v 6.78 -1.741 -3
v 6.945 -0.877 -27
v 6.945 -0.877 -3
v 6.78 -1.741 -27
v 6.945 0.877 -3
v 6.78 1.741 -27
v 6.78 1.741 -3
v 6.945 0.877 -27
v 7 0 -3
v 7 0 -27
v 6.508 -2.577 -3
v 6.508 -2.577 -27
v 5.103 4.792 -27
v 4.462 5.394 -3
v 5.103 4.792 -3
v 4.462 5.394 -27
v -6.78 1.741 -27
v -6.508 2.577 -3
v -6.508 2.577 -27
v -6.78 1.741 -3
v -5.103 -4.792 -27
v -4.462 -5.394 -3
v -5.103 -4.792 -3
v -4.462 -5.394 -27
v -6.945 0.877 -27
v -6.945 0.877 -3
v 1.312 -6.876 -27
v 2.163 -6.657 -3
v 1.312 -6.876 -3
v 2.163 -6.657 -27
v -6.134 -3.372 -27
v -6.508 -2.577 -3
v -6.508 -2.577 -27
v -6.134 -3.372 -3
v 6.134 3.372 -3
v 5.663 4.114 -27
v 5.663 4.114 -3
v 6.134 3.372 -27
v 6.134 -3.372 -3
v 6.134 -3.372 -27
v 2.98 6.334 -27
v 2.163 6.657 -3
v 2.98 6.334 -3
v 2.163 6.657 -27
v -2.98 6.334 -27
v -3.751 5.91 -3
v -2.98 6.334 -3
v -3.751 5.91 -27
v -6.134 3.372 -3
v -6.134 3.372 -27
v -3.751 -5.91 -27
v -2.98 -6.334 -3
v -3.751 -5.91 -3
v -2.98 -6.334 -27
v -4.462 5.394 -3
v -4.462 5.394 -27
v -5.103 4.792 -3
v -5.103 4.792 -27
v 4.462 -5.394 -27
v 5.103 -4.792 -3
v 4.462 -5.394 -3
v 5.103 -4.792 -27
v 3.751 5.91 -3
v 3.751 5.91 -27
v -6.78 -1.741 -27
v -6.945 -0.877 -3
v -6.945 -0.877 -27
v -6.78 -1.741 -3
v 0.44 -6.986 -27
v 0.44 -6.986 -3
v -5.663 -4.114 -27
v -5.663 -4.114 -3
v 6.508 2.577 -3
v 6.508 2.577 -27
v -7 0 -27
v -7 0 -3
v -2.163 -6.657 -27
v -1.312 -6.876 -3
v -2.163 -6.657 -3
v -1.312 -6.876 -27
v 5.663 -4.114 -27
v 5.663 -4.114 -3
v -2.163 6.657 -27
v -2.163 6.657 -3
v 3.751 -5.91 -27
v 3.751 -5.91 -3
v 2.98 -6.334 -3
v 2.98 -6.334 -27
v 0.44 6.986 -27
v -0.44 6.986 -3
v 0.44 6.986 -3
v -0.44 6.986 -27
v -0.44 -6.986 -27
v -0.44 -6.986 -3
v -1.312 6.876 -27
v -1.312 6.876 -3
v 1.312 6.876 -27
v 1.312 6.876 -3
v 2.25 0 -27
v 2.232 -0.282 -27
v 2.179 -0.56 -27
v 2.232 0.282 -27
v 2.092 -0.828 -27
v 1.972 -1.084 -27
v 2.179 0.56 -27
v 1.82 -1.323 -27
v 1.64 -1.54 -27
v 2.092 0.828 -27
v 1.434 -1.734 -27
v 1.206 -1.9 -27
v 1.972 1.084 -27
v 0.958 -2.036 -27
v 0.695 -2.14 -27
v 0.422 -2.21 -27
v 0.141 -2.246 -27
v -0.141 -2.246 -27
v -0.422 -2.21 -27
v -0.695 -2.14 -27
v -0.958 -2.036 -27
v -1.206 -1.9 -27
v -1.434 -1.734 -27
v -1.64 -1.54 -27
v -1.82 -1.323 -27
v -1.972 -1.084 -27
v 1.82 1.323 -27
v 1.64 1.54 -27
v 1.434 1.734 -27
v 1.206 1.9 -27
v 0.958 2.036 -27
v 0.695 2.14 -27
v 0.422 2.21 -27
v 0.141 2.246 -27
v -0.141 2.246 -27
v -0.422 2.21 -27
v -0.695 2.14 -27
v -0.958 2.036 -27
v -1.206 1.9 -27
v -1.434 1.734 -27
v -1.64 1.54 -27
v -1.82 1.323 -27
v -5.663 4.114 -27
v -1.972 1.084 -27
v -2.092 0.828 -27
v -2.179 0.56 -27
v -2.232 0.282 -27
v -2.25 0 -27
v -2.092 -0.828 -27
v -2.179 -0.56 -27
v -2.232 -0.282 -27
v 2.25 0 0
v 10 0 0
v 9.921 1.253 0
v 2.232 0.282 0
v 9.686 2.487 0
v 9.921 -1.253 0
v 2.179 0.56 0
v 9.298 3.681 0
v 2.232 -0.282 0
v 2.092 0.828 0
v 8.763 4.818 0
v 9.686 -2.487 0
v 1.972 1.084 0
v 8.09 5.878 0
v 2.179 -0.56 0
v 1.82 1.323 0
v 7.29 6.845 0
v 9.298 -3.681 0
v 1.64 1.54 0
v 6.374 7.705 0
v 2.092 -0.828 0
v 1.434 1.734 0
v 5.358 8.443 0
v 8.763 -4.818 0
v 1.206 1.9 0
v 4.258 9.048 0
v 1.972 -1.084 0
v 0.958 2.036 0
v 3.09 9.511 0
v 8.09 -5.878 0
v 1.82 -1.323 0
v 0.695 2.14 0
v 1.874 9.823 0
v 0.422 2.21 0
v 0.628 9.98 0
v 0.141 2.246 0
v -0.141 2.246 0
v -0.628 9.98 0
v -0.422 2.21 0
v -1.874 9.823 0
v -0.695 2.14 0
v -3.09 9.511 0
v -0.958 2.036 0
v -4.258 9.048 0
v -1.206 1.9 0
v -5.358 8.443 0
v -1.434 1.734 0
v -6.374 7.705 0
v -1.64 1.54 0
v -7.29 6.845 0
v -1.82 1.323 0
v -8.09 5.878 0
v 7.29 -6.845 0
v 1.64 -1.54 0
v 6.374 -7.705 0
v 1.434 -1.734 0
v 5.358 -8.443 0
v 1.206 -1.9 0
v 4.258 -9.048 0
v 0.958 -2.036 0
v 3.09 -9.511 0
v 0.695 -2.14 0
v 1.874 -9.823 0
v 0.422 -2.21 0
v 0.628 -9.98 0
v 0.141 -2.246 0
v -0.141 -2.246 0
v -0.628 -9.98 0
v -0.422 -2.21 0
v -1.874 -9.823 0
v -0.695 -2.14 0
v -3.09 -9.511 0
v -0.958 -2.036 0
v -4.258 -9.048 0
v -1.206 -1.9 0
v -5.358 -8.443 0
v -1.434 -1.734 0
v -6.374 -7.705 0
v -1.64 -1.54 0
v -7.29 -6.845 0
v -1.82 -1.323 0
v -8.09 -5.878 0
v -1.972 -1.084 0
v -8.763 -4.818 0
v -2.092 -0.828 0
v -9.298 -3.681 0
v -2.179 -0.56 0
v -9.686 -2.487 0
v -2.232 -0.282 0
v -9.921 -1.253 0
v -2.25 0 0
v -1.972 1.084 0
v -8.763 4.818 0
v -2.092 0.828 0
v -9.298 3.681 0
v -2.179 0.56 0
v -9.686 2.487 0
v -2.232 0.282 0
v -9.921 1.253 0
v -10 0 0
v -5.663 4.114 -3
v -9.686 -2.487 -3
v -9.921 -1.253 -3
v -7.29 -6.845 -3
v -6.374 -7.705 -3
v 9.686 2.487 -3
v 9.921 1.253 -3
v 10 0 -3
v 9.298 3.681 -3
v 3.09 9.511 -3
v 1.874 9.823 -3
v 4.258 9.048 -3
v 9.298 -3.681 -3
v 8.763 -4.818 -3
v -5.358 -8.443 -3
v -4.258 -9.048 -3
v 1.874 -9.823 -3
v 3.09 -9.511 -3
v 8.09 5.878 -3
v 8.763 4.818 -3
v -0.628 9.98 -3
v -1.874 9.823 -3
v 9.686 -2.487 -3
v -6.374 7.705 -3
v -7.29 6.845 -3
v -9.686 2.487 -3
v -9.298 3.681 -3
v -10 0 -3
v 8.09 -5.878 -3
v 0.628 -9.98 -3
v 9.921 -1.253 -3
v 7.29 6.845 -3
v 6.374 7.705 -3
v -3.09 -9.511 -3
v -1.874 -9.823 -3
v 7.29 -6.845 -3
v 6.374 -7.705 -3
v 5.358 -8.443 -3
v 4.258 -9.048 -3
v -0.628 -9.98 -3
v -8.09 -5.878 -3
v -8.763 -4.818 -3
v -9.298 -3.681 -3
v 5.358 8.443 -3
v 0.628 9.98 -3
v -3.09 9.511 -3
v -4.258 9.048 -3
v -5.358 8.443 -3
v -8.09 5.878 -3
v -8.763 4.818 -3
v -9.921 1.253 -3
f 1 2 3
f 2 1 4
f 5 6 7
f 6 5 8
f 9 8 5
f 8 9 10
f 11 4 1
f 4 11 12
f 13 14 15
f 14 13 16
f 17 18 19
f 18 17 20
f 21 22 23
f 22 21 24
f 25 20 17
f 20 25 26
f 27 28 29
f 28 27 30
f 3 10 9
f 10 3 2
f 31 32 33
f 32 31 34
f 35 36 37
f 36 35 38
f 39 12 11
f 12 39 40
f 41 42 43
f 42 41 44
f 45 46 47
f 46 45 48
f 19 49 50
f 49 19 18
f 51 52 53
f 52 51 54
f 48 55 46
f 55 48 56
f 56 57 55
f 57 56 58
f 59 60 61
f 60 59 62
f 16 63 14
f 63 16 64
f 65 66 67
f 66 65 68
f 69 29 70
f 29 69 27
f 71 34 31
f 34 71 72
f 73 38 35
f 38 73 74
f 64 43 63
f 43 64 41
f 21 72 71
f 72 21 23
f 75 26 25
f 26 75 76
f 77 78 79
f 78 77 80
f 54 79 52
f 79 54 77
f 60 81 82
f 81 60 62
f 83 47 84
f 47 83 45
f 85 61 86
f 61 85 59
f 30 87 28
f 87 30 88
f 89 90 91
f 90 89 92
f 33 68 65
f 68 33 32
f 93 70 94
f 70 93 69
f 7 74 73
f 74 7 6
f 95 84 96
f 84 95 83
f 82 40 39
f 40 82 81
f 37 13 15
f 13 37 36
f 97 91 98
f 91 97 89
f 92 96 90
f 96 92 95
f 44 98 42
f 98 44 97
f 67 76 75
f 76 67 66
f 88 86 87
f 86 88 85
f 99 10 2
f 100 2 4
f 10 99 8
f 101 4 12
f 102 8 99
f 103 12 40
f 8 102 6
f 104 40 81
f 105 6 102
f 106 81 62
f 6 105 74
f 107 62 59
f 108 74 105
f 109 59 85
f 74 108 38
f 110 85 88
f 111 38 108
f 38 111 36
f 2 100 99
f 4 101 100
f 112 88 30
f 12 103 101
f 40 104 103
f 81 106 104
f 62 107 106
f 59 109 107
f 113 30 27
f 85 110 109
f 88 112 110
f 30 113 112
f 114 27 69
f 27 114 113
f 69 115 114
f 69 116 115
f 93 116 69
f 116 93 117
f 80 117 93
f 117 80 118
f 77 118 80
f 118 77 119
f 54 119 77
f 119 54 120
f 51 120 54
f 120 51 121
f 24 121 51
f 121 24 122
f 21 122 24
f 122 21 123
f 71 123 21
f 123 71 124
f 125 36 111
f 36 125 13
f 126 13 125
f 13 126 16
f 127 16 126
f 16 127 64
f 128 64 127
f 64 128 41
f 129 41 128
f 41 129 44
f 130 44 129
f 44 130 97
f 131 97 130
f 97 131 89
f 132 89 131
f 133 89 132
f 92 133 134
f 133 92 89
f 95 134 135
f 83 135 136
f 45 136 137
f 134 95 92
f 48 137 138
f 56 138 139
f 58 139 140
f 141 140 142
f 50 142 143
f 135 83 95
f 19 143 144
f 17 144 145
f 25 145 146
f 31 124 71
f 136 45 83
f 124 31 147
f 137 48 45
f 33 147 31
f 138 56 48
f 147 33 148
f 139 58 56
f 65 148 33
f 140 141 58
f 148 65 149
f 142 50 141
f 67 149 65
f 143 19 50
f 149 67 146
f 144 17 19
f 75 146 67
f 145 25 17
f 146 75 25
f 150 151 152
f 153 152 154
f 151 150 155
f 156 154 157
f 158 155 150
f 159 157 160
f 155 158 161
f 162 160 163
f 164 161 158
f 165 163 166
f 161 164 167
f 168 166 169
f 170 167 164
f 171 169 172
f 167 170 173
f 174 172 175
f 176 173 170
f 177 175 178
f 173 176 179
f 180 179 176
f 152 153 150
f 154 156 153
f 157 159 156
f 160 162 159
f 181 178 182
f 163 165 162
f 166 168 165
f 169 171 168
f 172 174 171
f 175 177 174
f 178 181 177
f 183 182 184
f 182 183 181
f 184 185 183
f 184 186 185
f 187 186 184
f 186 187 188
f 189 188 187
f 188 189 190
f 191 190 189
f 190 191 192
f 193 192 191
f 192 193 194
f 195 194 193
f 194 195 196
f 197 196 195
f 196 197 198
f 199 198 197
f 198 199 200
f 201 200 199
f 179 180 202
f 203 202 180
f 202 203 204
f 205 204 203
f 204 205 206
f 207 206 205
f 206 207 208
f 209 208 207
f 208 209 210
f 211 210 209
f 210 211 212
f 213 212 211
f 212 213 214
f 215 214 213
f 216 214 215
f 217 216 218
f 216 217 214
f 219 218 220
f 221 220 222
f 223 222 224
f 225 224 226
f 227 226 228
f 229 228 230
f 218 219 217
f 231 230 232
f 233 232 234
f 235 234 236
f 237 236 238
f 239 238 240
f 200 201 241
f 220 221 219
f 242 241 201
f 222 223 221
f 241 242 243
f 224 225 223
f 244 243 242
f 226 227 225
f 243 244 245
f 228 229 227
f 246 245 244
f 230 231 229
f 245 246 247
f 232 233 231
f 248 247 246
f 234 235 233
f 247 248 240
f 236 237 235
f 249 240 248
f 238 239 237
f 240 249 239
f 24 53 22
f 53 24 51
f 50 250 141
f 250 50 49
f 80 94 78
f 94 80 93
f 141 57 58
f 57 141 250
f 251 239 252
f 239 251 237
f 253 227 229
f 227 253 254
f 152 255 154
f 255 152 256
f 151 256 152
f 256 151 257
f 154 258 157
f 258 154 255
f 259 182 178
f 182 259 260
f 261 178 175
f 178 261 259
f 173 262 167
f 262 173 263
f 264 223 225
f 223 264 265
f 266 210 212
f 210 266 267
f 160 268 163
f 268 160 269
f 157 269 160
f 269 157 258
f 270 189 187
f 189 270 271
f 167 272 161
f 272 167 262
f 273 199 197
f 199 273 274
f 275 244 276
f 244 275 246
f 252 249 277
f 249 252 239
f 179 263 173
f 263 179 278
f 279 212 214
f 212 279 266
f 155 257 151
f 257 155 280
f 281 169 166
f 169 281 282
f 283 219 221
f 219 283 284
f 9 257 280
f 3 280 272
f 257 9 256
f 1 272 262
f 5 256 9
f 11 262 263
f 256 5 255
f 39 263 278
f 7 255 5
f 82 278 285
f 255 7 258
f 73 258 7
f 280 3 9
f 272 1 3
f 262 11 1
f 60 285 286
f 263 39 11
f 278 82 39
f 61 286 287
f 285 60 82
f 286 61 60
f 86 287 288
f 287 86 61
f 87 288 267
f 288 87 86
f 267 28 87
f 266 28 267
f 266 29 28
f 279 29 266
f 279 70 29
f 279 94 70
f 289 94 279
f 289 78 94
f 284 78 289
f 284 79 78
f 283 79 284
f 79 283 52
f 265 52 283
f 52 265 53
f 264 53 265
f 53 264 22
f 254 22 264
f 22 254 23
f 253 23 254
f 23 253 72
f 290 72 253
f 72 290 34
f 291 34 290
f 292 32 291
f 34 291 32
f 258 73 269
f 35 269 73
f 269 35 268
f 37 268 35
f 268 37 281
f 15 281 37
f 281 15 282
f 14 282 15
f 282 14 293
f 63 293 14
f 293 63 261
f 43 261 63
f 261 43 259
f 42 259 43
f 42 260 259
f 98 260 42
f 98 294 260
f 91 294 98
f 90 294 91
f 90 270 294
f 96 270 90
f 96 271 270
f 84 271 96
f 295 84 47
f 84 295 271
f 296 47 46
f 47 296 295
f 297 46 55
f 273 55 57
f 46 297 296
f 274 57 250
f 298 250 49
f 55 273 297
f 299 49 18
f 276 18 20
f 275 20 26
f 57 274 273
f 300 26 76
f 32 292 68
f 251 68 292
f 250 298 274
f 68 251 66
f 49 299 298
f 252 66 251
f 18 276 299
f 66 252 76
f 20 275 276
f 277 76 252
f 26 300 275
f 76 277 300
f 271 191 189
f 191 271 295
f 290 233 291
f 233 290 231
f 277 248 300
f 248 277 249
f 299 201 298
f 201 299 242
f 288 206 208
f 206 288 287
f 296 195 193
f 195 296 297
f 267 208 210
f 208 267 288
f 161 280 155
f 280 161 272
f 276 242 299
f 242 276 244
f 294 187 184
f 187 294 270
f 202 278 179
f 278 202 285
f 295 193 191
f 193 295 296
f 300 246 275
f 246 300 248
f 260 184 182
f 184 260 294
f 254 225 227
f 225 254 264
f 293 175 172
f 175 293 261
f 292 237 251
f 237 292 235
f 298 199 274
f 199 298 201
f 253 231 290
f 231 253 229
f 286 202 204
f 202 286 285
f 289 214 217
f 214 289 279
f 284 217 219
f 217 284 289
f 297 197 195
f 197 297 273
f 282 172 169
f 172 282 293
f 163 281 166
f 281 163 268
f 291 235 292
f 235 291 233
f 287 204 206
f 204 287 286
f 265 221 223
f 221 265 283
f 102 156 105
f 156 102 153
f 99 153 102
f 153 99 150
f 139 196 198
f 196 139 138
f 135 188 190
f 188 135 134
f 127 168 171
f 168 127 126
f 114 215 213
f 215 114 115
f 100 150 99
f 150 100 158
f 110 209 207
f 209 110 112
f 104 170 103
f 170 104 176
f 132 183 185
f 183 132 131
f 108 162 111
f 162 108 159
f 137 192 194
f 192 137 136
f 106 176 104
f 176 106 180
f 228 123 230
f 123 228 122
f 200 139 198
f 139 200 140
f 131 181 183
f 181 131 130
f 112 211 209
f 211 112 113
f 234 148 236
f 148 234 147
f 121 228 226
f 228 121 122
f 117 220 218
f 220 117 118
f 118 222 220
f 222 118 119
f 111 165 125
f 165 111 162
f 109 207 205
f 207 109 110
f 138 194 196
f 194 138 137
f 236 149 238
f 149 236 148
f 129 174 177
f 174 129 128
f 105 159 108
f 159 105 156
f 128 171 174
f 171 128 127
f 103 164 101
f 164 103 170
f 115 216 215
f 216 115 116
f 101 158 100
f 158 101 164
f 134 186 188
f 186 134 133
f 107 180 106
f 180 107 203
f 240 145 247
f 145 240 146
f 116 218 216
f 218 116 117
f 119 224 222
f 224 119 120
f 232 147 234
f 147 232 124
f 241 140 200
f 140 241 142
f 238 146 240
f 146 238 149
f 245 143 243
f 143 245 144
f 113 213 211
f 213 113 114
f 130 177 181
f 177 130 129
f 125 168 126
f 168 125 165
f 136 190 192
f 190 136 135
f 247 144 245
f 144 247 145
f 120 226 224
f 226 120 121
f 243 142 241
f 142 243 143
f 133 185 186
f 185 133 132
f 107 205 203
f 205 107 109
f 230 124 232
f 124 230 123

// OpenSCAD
$fn = 50;


difference() {
	union() {
		translate(v = [0, 0, -27.0000000000]) {
			cylinder(h = 27, r = 7.0000000000);
		}
		translate(v = [0, 0, -3.0000000000]) {
			cylinder(h = 3, r = 10.0000000000);
		}
	}
	union() {
		#translate(v = [0, 0, -27]) {
			cylinder(h = 27, r = 2.2500000000);
		}
	}
}
